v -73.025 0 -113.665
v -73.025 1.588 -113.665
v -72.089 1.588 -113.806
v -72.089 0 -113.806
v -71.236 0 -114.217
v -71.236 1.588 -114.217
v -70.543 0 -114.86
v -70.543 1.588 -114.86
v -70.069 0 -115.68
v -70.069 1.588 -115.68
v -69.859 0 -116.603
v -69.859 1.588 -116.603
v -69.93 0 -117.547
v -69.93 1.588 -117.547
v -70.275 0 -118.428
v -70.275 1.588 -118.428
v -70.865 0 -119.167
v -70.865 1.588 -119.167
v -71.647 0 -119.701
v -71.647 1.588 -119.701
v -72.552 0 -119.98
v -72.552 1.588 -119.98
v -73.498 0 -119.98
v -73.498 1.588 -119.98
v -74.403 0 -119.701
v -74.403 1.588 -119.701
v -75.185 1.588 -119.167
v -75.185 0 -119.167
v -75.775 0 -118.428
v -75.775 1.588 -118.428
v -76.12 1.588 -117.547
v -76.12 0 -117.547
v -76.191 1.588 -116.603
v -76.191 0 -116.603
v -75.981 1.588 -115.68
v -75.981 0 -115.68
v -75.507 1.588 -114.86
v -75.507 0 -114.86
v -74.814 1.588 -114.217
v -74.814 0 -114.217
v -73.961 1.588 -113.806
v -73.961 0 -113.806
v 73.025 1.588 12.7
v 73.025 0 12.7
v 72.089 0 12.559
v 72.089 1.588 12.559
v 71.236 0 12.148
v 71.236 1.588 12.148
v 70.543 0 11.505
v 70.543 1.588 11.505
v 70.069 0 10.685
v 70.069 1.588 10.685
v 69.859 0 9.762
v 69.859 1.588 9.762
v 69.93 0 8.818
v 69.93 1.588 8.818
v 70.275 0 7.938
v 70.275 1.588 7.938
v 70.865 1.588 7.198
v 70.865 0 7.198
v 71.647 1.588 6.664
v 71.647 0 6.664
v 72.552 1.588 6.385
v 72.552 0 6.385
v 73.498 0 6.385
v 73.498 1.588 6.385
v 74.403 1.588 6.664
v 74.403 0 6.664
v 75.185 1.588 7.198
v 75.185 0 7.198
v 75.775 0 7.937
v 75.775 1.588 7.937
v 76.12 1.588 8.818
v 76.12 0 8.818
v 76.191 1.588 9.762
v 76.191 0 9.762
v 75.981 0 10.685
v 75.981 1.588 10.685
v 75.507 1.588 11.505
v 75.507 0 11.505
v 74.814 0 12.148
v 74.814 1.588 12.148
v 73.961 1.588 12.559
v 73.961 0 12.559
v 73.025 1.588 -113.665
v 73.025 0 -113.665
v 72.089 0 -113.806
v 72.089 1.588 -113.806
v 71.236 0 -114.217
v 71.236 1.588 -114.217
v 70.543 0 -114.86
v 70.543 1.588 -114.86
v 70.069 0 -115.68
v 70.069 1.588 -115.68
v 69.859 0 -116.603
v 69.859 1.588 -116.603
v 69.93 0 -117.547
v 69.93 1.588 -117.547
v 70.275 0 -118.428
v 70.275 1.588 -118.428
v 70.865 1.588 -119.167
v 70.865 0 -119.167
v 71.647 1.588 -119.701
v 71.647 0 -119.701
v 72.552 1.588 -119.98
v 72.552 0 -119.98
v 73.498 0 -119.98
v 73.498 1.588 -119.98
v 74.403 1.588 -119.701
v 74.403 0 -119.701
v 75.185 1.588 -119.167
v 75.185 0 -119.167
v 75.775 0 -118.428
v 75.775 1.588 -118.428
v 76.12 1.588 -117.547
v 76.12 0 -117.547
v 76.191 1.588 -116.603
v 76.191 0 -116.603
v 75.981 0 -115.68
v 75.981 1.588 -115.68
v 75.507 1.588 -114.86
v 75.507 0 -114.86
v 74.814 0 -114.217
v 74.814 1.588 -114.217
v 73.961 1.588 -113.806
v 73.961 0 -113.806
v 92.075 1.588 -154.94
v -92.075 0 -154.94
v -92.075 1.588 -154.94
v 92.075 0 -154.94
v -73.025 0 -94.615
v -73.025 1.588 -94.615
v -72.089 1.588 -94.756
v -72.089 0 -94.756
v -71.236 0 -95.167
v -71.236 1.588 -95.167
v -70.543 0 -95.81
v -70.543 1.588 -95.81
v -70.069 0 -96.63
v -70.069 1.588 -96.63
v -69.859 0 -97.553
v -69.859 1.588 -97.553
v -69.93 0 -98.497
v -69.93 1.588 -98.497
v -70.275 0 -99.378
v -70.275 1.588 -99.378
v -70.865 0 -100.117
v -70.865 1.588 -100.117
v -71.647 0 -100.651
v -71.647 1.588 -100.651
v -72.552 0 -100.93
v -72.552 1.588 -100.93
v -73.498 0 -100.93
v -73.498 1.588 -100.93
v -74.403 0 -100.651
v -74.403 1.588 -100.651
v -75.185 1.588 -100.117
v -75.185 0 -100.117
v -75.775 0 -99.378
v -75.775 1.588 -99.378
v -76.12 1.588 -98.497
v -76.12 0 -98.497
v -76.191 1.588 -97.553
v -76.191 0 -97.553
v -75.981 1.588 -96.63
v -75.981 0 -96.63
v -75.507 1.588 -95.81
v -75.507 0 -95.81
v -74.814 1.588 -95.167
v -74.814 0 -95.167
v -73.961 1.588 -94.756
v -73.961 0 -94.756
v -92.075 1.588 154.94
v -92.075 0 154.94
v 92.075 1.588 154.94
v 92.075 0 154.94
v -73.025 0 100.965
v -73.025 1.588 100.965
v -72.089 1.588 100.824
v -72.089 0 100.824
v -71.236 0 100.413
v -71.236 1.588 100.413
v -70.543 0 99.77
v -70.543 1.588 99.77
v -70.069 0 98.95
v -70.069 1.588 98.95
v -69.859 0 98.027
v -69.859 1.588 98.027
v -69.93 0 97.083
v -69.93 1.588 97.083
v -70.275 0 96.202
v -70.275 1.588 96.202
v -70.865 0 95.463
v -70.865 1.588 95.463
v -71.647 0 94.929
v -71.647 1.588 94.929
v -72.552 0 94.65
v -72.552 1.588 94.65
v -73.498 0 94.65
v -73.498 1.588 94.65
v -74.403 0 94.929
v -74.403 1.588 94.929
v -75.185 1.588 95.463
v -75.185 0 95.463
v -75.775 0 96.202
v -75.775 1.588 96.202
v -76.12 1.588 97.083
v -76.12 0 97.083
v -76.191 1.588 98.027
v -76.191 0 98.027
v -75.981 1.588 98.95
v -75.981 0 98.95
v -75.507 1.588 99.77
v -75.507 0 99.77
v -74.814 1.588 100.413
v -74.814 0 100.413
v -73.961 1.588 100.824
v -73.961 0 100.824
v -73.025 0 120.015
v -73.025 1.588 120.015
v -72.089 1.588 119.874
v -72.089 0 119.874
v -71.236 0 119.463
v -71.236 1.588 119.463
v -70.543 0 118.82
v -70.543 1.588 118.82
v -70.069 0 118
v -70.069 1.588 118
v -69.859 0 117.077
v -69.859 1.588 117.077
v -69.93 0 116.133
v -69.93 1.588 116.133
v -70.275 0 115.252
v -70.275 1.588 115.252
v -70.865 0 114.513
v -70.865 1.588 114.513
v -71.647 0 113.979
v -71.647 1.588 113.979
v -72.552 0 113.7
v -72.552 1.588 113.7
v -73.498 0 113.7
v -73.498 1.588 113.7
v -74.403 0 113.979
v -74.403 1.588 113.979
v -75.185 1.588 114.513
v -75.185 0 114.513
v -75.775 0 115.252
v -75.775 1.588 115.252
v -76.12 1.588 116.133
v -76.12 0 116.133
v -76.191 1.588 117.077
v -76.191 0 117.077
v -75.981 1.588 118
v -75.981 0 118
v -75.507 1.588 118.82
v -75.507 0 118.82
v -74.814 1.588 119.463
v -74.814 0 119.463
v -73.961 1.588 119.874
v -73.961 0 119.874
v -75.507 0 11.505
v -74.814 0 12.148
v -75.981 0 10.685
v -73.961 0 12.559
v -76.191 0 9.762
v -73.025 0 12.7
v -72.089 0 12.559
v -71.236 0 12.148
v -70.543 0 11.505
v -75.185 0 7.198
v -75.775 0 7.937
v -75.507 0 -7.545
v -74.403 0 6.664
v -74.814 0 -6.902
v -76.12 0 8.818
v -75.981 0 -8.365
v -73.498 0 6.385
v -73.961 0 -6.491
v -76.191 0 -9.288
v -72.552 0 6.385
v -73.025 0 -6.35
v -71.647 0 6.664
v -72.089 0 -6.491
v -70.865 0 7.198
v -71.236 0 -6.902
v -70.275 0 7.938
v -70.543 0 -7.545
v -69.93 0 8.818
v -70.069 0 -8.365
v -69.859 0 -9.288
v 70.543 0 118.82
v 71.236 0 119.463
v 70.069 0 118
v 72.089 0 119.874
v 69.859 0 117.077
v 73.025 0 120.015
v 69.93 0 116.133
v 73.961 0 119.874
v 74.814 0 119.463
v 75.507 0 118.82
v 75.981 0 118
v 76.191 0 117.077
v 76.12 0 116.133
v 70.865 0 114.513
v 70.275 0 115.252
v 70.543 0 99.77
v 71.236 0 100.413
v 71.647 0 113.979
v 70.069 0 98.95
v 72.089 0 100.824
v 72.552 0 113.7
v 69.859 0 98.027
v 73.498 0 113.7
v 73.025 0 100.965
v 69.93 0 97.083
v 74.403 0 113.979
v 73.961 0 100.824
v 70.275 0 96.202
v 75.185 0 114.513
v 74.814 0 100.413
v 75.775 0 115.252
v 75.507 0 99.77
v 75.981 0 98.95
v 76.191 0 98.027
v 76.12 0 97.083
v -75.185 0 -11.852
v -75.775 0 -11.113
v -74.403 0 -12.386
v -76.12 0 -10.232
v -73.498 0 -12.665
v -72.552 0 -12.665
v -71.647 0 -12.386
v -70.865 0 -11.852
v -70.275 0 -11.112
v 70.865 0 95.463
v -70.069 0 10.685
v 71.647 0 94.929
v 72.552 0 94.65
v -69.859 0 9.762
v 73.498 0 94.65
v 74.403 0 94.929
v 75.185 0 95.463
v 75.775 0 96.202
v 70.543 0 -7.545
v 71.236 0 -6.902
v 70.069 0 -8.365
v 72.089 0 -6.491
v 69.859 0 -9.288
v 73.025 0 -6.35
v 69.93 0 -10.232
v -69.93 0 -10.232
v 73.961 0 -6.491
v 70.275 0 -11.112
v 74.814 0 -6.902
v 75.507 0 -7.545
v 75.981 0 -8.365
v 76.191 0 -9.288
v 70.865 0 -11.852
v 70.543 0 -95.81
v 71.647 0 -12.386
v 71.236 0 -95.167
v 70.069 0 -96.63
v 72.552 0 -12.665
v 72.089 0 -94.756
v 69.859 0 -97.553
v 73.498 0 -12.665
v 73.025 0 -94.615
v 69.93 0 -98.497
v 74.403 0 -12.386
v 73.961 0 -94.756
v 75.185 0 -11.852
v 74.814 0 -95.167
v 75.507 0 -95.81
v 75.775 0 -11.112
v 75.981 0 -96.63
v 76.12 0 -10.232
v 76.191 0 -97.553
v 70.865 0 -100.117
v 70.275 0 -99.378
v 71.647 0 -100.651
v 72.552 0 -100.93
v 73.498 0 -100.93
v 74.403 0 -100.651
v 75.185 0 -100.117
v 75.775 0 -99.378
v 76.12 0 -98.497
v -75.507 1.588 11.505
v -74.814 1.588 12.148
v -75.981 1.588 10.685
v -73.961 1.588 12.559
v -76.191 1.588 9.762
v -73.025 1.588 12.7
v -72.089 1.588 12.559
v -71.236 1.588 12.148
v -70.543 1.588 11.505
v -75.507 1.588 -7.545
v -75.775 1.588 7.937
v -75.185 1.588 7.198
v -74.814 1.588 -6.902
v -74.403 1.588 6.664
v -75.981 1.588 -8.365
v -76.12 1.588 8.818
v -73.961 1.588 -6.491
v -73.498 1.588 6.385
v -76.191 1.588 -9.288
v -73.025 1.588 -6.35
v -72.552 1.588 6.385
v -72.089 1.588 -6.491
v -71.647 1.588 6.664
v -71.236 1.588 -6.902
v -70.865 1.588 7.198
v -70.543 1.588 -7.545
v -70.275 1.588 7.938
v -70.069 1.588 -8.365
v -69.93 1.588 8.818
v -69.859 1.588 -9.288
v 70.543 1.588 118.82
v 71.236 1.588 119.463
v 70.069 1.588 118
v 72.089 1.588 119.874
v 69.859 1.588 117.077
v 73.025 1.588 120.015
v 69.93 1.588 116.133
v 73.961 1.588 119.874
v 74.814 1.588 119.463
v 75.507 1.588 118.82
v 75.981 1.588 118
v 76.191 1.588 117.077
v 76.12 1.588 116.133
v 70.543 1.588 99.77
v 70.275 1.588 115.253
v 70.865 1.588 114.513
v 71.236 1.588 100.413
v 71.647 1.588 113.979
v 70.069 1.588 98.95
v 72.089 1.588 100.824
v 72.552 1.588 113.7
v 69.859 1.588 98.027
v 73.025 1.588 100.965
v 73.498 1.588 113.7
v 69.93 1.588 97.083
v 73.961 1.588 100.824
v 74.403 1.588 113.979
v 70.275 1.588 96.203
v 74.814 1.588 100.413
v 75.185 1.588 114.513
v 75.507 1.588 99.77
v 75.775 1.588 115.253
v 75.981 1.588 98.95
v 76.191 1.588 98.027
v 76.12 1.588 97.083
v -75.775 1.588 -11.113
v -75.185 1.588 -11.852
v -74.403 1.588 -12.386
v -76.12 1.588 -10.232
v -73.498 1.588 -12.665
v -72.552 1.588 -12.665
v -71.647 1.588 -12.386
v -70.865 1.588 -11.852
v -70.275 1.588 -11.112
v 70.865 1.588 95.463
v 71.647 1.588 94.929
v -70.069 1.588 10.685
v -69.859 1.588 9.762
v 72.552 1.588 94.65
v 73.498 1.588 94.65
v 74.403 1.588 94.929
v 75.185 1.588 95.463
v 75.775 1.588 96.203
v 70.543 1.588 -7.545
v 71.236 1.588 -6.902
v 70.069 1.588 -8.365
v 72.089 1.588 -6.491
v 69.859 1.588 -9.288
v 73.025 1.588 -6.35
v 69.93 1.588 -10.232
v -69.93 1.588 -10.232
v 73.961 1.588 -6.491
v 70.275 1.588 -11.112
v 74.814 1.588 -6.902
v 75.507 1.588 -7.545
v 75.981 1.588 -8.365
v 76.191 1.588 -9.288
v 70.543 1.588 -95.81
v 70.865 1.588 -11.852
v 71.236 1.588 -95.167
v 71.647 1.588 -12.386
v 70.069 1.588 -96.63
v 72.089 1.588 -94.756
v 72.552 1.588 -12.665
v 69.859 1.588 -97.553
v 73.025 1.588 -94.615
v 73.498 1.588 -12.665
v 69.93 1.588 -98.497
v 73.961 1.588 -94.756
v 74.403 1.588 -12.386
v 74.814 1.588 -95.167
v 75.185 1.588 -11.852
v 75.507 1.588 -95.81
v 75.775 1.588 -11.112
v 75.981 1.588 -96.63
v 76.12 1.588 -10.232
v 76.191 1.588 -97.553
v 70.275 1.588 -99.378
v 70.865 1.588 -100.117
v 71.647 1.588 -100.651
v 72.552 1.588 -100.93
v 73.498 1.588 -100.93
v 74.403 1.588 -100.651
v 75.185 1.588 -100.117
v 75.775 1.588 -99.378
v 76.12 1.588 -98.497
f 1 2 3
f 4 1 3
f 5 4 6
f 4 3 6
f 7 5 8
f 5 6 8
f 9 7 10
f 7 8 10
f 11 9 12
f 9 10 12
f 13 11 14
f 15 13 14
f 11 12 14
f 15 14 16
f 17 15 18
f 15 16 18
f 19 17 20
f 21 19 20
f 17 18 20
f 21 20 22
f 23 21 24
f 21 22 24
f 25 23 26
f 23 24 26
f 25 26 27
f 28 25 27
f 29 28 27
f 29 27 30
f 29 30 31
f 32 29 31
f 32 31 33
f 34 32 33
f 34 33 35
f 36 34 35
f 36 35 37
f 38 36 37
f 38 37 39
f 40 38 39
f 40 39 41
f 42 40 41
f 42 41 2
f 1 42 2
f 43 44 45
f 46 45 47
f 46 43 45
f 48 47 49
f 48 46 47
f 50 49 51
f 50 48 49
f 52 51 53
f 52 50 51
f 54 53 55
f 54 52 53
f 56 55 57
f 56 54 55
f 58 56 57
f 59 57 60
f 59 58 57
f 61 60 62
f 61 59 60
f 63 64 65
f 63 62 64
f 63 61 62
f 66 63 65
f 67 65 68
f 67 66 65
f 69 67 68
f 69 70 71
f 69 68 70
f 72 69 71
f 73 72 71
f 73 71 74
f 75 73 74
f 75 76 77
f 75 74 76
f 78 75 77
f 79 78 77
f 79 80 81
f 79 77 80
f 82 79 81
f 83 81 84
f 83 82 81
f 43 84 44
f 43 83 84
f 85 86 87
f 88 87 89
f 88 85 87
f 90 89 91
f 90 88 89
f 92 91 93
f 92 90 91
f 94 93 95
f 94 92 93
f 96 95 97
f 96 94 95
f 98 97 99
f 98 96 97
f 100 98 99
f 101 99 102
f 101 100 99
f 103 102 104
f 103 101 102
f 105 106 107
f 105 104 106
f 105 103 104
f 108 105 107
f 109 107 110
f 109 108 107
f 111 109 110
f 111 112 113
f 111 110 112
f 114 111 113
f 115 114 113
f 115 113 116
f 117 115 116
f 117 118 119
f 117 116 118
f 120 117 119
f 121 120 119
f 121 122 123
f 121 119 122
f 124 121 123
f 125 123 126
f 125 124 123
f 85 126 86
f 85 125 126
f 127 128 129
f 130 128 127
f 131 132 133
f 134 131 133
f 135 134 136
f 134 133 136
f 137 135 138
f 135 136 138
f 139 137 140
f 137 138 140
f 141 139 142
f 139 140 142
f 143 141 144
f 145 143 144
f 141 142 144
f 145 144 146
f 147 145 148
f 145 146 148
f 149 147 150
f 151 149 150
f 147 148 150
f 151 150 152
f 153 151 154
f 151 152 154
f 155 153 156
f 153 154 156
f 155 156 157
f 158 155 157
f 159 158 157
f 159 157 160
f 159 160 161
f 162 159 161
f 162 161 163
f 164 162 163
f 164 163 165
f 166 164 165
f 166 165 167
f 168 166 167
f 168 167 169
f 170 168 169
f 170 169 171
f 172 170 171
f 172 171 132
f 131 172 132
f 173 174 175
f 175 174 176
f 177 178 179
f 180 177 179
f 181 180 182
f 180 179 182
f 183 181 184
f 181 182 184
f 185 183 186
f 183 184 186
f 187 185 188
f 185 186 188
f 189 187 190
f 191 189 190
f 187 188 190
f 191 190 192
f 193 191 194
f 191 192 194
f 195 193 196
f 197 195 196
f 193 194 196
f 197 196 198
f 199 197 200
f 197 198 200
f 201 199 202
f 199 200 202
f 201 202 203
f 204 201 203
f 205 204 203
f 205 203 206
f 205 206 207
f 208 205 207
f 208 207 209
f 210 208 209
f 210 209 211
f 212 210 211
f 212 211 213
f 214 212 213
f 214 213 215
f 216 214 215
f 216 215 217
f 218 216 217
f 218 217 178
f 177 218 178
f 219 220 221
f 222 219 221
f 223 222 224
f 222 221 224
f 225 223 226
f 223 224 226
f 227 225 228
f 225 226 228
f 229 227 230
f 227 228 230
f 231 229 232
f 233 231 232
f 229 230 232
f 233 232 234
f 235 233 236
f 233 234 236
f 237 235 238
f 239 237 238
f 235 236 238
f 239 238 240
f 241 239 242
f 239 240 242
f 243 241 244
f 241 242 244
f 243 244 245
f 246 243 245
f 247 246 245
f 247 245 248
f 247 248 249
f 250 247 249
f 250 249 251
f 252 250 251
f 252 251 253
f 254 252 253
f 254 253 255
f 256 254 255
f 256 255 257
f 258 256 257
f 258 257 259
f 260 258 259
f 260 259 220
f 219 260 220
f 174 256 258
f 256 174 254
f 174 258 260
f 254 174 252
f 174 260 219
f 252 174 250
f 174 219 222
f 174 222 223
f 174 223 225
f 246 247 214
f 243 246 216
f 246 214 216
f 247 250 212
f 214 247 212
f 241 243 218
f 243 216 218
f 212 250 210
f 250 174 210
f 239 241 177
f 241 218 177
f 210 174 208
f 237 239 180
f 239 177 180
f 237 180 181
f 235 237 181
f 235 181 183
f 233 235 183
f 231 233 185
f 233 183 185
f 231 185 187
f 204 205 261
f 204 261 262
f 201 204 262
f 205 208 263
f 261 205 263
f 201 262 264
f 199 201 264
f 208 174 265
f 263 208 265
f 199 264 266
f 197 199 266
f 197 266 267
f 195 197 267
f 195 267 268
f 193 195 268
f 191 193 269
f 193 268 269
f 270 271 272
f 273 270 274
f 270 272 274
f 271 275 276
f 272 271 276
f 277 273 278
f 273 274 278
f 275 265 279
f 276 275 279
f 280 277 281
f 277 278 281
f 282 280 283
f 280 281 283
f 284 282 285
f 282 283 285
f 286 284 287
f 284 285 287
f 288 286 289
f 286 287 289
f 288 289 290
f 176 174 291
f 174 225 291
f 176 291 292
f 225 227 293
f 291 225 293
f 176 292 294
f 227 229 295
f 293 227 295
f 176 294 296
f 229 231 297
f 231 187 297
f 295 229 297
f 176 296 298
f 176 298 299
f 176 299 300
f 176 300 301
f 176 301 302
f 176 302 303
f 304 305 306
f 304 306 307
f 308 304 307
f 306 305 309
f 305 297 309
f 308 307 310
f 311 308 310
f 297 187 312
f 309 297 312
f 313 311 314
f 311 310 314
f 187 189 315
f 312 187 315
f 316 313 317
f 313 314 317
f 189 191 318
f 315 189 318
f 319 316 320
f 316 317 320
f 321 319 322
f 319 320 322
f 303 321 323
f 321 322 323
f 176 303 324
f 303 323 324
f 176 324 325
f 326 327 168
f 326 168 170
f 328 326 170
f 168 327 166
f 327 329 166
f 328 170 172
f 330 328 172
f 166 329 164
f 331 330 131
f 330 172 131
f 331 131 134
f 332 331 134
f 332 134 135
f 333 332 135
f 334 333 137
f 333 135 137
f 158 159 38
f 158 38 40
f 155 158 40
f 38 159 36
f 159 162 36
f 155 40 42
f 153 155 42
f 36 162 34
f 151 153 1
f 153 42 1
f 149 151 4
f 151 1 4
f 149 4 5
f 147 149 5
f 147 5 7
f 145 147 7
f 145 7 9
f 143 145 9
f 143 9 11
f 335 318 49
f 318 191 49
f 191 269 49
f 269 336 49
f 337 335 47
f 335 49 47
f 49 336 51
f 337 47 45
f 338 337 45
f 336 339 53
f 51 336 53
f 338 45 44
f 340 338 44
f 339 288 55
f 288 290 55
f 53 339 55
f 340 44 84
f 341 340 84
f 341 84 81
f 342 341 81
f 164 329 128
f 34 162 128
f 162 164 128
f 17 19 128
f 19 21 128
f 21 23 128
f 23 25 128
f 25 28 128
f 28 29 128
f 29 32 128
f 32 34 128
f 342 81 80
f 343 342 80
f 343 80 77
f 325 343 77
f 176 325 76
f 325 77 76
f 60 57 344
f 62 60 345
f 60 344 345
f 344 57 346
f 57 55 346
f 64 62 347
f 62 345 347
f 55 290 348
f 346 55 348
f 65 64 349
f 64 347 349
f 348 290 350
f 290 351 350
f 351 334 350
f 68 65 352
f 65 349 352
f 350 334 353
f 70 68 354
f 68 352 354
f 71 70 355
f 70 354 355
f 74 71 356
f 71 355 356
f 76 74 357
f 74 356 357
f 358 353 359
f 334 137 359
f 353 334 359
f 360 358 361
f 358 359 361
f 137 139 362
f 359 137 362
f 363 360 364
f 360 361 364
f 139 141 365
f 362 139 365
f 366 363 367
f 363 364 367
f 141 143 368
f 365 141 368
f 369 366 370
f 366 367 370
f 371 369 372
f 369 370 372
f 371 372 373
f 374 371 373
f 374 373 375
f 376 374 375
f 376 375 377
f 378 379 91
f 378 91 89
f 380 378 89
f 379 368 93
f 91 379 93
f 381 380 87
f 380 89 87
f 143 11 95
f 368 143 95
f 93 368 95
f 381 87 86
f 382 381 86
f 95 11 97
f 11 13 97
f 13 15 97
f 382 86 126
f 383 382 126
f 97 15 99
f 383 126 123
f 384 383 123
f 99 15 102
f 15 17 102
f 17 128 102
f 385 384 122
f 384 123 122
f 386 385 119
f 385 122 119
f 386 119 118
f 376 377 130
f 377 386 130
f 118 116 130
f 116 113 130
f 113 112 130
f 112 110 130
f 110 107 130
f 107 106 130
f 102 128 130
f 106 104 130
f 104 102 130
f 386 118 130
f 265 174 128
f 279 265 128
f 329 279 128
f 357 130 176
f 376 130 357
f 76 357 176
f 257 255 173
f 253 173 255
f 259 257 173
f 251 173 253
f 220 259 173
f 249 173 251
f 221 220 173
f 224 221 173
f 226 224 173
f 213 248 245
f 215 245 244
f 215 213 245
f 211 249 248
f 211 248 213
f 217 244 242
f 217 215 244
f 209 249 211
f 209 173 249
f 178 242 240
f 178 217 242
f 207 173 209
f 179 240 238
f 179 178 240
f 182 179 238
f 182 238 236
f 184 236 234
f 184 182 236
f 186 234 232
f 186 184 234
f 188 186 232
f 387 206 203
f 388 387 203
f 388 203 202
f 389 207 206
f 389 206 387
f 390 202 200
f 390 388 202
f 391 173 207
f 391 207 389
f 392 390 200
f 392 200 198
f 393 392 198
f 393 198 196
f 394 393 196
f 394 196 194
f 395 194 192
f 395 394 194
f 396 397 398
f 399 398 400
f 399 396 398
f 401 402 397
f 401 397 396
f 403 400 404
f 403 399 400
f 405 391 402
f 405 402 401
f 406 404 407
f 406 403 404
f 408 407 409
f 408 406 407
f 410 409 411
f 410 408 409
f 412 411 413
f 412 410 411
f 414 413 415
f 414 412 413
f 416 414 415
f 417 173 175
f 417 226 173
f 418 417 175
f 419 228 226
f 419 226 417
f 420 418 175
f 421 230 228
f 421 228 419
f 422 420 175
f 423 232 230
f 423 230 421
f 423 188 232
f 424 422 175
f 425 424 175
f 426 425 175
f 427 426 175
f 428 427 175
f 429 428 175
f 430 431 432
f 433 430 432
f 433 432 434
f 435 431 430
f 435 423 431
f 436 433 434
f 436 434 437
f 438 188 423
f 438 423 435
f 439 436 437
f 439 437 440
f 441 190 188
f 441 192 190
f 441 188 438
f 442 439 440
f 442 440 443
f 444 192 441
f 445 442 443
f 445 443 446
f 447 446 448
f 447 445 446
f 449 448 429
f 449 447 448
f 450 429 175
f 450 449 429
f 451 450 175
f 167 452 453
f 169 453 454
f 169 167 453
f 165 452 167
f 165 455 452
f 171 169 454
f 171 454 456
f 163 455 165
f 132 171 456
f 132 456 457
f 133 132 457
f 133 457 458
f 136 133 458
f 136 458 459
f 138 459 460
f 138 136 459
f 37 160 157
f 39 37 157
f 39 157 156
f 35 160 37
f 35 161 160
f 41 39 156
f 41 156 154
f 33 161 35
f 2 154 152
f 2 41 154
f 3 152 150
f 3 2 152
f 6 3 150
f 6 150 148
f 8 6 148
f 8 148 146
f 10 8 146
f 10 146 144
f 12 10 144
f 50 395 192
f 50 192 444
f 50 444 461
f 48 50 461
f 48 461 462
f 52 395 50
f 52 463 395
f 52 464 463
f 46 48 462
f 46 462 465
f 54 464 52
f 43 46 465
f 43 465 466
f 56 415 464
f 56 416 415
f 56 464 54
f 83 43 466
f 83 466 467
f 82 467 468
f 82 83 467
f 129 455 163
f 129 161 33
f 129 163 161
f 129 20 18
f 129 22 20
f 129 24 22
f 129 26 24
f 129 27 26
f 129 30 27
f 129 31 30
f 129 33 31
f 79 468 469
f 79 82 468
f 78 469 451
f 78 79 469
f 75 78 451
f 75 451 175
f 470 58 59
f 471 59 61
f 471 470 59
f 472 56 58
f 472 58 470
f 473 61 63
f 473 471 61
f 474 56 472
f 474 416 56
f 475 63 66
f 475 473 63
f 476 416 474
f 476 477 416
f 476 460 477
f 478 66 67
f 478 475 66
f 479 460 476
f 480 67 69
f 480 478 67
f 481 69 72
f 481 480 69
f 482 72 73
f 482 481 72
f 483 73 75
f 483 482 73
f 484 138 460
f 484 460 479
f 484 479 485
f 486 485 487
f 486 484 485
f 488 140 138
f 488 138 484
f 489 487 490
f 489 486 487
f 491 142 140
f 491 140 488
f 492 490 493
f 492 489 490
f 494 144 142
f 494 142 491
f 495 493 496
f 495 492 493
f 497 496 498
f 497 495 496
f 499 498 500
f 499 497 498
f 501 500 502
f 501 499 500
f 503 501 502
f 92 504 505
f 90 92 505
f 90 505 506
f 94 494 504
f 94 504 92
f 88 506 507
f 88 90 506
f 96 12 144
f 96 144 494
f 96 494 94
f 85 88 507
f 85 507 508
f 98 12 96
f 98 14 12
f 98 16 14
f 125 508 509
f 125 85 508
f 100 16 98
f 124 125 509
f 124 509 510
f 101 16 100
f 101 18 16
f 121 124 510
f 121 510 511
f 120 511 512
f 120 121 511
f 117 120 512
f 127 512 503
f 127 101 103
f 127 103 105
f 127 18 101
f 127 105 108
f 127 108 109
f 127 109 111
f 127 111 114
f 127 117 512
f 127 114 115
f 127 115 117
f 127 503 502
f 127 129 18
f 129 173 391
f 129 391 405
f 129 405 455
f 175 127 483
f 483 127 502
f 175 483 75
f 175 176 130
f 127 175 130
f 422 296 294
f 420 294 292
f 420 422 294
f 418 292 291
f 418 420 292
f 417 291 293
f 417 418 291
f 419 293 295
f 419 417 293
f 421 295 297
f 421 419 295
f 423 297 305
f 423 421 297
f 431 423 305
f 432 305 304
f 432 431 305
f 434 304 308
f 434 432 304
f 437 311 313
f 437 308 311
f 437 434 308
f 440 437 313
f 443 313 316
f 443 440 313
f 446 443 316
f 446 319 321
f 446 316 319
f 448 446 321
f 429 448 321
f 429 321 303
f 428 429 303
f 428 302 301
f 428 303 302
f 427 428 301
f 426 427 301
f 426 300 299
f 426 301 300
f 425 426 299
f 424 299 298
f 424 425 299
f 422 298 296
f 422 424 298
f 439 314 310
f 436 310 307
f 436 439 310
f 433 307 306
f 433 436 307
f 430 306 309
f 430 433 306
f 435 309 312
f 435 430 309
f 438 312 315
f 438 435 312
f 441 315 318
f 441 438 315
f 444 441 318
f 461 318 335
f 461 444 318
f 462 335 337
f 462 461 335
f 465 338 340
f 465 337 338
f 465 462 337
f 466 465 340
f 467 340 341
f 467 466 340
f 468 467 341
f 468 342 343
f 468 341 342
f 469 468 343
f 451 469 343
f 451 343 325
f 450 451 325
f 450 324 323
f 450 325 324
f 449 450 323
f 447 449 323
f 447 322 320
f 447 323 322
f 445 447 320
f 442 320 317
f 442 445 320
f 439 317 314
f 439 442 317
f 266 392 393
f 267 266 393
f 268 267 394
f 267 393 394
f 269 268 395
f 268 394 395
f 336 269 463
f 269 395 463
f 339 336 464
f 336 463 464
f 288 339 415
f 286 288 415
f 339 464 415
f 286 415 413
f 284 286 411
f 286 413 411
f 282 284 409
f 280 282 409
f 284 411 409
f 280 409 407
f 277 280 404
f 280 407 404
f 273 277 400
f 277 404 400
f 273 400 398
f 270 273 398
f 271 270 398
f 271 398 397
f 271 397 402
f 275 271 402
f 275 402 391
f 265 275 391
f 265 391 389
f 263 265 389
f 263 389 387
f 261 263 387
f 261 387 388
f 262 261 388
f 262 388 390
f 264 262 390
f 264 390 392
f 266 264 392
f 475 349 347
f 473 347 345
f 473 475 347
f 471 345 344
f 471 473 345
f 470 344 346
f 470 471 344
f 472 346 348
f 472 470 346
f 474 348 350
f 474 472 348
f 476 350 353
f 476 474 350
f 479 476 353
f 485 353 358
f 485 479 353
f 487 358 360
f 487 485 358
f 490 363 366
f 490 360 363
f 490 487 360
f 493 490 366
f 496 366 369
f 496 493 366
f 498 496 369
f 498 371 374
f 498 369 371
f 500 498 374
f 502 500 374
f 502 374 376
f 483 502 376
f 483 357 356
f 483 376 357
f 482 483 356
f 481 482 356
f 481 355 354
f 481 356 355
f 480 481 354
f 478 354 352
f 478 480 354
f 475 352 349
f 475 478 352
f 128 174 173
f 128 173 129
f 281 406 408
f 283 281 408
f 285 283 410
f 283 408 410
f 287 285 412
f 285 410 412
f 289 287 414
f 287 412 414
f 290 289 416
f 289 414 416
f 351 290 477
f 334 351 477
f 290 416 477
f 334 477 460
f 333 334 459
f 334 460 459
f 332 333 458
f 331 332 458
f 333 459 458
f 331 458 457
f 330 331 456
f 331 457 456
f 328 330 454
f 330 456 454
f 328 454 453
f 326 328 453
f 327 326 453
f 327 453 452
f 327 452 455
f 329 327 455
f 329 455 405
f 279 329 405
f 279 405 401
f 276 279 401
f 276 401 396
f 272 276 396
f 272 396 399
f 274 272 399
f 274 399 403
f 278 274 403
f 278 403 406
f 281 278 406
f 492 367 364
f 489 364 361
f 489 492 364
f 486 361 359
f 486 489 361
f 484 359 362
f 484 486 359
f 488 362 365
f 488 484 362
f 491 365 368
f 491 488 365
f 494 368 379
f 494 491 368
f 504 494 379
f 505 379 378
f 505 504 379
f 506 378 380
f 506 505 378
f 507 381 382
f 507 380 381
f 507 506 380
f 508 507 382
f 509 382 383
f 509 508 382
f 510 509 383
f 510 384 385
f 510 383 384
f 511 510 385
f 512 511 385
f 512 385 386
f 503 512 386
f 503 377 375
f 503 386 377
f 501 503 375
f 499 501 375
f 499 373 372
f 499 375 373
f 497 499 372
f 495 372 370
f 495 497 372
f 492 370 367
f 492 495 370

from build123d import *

# Parameters (mm, degrees)
SKETCH1_W           = 184.15
SKETCH1_H           = 309.88
BOSS_EXTRUDE1_DEPTH = 1.5875
SKETCH2_R           = 3.175
CUT_EXTRUDE1_DEPTH  = 181.240753941


with BuildPart() as part:
    # Sketch1 → Boss-Extrude1 (new body)
    with BuildSketch(Plane(origin=(0, 0, 0), x_dir=(1, 0, 0), z_dir=(0, 1, 0))):
        Rectangle(SKETCH1_W, SKETCH1_H)
    extrude(amount=BOSS_EXTRUDE1_DEPTH)

    # Sketch2 → Cut-Extrude1 (cut, through all)
    with BuildSketch(Plane(origin=(0, 1.5875, 0), x_dir=(1, 0, 0), z_dir=(0, 1, 0))):
        with Locations(Location((-73.025, 9.525, 0), (0, 0, 270))):
            Circle(SKETCH2_R)
        with Locations(Location((-73.025, -9.525, 0), (0, 0, 270))):
            Circle(SKETCH2_R)
        with Locations(Location((-73.025, 116.84, 0), (0, 0, 270))):
            Circle(SKETCH2_R)
        with Locations(Location((-73.025, 97.79, 0), (0, 0, 270))):
            Circle(SKETCH2_R)
        with Locations(Location((-73.025, -116.84, 0), (0, 0, 270))):
            Circle(SKETCH2_R)
        with Locations(Location((-73.025, -97.79, 0), (0, 0, 270))):
            Circle(SKETCH2_R)
    cut_extrude1 = extrude(amount=-CUT_EXTRUDE1_DEPTH, mode=Mode.SUBTRACT)

    # Mirror1: Cut-Extrude1 across plane
    add(cut_extrude1.mirror(Plane(origin=(0, 0, 0), x_dir=(0, 0, 1), z_dir=(1, 0, 0))), mode=Mode.SUBTRACT)


solid = part.part
